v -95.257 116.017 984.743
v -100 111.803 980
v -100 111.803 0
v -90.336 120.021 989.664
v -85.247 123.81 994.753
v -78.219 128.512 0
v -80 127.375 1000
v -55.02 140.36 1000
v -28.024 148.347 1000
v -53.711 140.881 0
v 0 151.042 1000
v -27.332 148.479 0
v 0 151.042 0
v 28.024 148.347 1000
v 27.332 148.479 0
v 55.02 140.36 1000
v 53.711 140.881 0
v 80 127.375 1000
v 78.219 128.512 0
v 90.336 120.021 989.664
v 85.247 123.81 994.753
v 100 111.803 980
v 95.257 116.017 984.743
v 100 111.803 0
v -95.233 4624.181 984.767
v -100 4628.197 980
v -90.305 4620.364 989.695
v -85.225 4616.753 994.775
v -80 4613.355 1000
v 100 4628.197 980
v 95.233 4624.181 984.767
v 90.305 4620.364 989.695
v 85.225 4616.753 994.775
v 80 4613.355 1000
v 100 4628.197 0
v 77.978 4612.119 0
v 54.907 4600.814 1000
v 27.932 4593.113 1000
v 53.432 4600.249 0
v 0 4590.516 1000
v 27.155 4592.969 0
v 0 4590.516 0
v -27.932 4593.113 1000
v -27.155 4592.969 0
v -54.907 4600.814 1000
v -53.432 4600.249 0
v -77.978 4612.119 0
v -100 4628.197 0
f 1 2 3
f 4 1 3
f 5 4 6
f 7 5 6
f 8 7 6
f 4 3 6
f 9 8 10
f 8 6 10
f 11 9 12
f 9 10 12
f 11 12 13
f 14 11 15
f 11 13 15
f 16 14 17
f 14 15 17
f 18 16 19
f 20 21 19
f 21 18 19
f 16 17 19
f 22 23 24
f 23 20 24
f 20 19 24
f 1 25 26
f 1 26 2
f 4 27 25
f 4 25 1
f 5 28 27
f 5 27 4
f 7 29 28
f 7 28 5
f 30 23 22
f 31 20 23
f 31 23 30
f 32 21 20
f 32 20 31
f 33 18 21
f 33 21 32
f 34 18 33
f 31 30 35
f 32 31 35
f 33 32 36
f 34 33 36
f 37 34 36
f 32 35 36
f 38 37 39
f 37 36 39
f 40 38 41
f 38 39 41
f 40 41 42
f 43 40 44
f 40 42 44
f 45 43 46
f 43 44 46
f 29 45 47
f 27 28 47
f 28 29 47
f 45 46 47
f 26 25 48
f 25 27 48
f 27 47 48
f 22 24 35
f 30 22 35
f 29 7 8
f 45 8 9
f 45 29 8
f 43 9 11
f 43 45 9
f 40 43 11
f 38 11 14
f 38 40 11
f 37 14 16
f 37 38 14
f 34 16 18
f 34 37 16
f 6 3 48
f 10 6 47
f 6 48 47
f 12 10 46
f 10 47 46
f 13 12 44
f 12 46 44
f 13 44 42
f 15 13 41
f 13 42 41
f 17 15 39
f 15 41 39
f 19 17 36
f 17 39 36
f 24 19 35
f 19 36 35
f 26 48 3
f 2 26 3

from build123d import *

# Parameters (mm, degrees)
F1_DEPTH = 1000
F2_SIZE  = 20


with BuildPart() as f1:
    # F0 (on Top) → F1 (new body)
    with BuildSketch(Plane.XY):
        with BuildLine():
            ThreePointArc((-100, 111.803399), (0, 151.041804), (100, 111.803399))
            Line((100, 111.803399), (100, 4628.196601))
            ThreePointArc((100, 4628.196601), (0, 4590.5164), (-100, 4628.196601))
            Line((-100, 4628.196601), (-100, 111.803399))
        make_face()
    extrude(amount=F1_DEPTH)

    # F2
    f2_edges = [f1.edges().sort_by_distance(p)[0] for p in [
        (100, 2370, 1000),
        (-100, 2370, 1000),
    ]]
    chamfer(f2_edges, length=F2_SIZE)


solid = f1.part
